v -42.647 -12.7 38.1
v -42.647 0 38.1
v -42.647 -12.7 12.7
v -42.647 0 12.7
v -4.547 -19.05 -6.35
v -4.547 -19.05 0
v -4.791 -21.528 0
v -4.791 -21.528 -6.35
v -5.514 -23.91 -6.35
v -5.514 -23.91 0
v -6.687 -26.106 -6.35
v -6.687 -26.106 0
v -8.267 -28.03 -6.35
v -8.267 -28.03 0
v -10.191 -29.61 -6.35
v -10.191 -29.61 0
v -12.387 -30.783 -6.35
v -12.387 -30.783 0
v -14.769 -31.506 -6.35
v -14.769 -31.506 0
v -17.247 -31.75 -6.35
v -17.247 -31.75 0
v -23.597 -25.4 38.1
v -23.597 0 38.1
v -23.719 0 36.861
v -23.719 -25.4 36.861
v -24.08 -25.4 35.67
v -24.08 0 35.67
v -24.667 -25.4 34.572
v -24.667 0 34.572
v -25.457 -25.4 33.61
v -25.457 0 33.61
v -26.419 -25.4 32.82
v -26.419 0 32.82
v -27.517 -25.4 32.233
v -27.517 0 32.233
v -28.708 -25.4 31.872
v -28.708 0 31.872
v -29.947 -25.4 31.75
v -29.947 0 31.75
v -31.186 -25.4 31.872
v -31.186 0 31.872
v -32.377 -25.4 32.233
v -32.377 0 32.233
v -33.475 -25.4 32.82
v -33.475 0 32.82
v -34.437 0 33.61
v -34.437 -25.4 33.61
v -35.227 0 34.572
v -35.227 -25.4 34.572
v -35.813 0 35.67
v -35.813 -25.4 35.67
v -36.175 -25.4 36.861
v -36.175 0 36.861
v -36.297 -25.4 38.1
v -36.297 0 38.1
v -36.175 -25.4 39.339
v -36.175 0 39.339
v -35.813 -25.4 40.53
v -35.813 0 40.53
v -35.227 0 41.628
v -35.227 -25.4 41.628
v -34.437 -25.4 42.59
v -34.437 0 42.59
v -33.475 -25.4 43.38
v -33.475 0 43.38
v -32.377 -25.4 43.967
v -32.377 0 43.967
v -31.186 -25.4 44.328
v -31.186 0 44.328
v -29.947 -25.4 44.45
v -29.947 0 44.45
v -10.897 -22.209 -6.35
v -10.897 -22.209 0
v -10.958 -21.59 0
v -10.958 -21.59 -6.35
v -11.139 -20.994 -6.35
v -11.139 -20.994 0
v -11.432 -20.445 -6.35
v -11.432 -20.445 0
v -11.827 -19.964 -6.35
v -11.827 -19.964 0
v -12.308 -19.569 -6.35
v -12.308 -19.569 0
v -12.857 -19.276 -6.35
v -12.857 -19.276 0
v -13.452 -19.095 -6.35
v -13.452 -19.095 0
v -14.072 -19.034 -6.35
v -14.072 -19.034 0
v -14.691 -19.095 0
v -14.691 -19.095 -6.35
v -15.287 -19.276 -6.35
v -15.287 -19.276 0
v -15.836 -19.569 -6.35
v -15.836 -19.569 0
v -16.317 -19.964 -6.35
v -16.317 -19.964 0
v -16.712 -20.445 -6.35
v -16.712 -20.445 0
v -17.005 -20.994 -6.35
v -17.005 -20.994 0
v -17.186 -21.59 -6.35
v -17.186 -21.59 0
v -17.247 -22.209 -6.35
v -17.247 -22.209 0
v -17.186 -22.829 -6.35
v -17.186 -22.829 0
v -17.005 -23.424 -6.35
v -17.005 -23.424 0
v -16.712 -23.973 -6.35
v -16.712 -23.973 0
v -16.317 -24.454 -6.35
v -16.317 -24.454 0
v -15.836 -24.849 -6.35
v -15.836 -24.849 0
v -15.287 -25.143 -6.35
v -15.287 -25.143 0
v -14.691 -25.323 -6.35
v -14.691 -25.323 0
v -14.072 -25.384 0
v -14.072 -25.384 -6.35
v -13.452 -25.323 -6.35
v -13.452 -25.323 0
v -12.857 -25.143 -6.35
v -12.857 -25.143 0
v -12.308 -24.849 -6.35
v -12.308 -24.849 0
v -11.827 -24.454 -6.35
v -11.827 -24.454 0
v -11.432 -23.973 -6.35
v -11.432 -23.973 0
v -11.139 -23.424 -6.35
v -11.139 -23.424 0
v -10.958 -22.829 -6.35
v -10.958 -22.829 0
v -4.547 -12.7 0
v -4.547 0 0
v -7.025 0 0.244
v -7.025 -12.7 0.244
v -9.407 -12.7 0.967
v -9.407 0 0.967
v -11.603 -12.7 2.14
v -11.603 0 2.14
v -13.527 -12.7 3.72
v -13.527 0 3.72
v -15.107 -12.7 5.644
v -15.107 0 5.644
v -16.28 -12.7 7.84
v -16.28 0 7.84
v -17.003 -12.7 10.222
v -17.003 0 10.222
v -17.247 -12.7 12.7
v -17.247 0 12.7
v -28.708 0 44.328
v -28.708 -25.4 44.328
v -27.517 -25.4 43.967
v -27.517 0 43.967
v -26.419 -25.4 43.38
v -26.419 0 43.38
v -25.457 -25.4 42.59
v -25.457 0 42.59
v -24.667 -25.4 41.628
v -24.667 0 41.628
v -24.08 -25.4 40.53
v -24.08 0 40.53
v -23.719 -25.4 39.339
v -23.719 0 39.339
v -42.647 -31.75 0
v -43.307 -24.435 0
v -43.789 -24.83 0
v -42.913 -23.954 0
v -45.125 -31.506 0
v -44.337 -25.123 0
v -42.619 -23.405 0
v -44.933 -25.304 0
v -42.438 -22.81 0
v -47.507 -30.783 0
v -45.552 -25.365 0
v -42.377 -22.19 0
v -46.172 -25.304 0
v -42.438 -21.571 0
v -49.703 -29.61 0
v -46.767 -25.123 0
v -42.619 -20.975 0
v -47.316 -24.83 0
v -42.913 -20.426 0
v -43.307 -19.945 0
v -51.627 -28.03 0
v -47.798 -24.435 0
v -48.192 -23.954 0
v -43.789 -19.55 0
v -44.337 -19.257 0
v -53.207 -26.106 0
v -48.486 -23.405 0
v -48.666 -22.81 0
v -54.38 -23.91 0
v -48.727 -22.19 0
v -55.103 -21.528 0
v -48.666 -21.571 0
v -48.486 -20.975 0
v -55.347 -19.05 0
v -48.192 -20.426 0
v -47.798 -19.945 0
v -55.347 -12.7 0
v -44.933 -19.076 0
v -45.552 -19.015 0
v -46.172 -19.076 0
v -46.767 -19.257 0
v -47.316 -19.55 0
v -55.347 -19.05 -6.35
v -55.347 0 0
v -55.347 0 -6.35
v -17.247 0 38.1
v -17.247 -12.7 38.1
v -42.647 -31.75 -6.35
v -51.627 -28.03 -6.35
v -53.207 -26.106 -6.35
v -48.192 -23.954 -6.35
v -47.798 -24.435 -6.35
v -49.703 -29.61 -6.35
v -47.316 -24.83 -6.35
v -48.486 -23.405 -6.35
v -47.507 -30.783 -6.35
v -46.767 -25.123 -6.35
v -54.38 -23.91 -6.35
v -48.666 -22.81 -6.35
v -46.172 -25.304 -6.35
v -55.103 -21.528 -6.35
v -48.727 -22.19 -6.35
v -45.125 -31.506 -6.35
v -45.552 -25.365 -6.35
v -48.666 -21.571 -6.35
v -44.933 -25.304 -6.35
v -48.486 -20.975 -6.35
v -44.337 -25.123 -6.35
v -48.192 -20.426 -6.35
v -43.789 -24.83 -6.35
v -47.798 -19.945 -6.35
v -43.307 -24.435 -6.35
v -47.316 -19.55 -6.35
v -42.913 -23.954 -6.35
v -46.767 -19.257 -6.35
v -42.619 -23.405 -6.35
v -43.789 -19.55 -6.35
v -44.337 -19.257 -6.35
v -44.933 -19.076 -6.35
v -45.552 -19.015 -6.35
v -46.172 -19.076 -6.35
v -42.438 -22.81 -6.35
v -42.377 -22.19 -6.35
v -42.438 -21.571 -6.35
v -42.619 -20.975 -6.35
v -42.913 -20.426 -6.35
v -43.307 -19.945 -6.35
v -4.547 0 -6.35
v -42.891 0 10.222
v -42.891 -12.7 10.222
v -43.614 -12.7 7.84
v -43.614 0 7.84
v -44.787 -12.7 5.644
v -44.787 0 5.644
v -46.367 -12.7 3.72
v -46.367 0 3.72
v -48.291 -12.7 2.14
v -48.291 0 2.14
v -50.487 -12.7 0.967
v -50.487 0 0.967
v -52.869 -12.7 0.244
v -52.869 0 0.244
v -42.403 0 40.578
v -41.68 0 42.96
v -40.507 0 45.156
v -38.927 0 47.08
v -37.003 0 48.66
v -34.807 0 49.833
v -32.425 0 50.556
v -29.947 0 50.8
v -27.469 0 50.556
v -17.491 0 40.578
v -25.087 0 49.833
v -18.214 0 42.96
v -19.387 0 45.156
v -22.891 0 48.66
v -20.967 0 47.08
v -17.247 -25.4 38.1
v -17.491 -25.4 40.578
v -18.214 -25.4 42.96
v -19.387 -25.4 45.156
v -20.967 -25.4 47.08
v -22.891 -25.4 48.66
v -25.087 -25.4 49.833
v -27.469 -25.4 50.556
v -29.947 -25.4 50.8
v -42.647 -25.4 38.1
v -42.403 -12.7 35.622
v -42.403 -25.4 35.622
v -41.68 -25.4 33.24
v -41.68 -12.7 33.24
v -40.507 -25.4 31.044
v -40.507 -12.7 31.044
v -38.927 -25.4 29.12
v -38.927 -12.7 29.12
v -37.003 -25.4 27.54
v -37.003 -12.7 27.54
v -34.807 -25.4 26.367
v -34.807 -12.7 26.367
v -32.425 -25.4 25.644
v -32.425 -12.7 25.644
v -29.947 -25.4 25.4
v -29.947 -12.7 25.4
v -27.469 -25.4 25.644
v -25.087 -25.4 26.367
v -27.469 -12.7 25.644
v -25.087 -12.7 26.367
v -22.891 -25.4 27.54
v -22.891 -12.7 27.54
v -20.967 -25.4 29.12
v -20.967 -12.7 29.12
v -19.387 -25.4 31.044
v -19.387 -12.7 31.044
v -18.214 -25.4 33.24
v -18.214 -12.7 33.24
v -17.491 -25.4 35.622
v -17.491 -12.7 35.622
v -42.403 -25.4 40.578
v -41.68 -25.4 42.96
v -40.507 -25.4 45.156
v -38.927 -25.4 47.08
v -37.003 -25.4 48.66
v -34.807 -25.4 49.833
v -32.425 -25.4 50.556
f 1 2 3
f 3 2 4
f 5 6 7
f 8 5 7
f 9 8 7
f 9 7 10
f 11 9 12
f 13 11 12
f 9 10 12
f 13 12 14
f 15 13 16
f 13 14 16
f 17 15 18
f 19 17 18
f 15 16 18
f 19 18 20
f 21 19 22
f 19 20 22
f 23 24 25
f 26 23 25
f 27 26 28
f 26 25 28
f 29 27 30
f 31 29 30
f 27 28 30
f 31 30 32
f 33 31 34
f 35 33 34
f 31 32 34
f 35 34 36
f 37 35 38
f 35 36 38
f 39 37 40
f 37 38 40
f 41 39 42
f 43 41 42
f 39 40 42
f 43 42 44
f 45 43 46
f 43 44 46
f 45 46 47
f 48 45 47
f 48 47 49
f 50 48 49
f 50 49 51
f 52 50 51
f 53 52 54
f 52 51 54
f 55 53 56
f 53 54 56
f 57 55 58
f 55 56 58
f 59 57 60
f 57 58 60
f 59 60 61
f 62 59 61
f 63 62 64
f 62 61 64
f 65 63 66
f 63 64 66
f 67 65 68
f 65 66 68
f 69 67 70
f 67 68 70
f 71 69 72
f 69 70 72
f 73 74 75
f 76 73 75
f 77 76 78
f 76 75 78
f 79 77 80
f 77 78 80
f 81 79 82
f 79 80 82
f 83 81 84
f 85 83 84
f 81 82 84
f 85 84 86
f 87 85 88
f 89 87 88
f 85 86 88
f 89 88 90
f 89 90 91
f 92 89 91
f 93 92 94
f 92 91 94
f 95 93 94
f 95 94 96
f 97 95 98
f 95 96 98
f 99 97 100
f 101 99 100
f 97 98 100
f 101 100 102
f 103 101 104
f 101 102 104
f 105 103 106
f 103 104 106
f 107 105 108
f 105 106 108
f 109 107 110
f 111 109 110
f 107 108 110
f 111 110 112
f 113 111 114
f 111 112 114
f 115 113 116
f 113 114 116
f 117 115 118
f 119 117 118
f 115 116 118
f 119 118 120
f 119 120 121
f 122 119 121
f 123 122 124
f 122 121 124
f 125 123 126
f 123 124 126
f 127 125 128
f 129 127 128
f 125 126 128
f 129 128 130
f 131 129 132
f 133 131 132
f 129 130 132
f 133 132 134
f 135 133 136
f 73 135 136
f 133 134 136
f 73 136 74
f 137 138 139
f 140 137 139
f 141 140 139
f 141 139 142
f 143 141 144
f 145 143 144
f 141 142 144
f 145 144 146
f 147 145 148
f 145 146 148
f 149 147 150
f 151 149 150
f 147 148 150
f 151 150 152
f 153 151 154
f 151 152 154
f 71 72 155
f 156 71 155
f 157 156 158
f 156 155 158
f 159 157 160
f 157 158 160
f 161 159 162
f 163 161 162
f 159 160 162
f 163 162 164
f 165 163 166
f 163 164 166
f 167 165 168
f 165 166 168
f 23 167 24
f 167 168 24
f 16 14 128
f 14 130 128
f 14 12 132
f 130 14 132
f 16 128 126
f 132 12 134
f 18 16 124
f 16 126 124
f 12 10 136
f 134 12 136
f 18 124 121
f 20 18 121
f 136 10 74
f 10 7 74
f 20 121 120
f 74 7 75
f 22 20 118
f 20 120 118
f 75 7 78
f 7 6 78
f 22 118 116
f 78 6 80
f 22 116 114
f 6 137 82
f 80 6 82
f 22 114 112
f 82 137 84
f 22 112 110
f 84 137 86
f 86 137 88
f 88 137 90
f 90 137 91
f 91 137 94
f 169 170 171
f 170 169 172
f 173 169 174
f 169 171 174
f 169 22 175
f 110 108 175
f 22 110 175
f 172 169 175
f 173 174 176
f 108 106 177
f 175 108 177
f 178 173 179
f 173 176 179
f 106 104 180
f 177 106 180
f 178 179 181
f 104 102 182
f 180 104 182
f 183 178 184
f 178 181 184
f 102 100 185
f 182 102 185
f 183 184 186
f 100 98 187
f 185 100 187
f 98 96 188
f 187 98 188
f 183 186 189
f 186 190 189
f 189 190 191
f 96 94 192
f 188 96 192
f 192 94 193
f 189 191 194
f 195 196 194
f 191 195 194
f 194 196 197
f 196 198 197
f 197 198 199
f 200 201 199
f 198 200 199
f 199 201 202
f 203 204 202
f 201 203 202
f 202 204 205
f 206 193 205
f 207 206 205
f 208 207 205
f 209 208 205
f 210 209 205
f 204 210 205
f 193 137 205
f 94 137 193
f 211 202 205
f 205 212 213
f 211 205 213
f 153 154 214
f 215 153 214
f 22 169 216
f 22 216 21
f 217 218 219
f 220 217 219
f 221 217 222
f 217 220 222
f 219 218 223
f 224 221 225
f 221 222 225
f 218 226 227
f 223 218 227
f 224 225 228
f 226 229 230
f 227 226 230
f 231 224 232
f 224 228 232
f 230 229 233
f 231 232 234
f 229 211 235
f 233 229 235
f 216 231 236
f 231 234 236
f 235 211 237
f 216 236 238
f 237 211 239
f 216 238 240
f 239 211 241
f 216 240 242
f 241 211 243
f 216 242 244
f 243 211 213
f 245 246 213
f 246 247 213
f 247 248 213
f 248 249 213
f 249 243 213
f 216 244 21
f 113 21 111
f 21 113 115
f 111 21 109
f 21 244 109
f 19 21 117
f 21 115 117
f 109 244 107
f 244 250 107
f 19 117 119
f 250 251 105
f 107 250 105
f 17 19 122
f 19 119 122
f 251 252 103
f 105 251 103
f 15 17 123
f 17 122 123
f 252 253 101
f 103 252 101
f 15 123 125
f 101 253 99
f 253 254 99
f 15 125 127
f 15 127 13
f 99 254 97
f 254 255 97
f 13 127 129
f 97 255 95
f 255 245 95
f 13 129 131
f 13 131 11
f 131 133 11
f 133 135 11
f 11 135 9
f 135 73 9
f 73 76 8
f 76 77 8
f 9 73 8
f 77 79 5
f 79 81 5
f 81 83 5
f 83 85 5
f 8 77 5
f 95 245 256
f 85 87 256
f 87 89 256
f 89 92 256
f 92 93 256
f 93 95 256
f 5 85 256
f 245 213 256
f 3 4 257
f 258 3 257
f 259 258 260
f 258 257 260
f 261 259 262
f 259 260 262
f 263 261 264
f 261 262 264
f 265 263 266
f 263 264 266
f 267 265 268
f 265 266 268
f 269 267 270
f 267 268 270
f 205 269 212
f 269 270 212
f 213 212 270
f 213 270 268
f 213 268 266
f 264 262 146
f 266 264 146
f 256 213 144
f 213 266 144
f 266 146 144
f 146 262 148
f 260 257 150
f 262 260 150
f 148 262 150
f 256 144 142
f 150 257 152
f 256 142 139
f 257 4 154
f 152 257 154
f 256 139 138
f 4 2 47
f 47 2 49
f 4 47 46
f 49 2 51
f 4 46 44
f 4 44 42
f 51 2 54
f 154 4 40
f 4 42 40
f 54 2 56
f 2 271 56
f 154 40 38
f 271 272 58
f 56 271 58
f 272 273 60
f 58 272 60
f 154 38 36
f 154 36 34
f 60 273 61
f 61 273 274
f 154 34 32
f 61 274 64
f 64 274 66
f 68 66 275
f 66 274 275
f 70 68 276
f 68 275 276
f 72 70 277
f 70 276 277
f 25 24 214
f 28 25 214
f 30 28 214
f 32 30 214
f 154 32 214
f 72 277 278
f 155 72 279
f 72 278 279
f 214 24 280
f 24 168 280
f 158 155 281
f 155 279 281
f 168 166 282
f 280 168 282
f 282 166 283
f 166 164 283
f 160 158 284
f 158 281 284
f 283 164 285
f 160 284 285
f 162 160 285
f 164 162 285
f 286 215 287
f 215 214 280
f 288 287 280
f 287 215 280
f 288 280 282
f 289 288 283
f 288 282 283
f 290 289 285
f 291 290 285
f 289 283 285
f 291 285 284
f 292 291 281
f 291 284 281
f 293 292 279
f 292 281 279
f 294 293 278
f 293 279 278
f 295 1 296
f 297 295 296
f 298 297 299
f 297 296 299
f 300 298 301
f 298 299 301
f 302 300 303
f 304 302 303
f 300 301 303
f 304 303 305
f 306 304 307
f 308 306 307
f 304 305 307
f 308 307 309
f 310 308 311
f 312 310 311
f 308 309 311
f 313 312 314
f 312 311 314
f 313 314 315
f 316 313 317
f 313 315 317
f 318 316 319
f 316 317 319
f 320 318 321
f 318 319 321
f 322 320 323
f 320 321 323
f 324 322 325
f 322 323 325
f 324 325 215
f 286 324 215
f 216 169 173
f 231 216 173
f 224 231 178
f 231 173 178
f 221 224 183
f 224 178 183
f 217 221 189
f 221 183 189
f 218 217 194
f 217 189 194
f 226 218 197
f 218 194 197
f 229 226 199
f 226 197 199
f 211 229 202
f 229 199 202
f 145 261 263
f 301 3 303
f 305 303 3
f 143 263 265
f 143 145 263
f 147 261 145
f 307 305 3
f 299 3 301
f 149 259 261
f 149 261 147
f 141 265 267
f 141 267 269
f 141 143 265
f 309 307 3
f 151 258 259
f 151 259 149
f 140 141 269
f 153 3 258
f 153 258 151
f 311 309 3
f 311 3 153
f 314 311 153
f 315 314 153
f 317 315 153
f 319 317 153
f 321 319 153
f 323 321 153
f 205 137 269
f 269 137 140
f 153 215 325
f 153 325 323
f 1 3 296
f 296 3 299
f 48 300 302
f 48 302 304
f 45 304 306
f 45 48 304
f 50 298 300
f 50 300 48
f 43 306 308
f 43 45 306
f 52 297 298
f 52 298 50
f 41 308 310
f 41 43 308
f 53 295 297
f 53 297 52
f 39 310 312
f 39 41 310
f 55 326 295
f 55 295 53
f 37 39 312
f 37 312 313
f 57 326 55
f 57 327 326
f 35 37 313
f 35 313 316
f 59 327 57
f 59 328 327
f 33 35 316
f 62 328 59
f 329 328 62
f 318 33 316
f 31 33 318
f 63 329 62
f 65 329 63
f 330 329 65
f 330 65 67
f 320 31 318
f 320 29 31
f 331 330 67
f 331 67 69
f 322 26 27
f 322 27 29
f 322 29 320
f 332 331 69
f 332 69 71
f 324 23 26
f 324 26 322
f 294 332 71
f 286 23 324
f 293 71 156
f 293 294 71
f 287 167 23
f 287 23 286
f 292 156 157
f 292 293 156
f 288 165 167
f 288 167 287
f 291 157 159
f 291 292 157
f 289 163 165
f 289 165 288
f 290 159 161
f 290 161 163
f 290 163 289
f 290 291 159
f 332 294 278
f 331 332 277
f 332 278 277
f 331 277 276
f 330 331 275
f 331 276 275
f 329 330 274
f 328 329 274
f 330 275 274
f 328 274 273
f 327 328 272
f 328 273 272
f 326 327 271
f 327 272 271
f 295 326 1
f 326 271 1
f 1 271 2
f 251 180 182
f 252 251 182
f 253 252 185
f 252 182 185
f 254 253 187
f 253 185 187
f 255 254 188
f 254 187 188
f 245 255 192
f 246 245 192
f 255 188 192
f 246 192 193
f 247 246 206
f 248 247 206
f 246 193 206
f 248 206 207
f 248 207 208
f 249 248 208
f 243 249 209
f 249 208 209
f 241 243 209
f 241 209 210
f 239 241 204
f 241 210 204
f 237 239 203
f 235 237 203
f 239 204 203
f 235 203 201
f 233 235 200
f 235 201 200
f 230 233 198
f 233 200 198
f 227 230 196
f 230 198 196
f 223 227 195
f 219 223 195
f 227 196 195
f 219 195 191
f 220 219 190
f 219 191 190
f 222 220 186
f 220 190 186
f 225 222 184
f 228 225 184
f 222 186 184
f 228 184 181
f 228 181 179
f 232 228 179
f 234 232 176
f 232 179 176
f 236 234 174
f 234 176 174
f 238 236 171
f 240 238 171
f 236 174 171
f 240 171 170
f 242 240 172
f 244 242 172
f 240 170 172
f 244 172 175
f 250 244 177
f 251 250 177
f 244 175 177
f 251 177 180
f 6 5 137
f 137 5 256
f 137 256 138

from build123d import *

# Parameters (mm, degrees)
F1_DEPTH = 31.75
F2_DEPTH = 25.4
F3_DEPTH = 12.7
F5_DEPTH = 6.35
F6_R     = 3.175
F7_DEPTH = 6.35


with BuildPart() as f1:
    # F0 (on Front) → F1 (new body)
    with BuildSketch(Plane.XZ):
        Polygon((-42.646856, 0), (-55.346856, 0), (-55.346856, -6.35), (-4.546856, -6.35), (-4.546856, 0), (-17.246856, 0), align=None)
    extrude(amount=F1_DEPTH)



with BuildPart() as f2:
    # F0 (on Front) → F2 (new body)
    with BuildSketch(Plane.XZ):
        with BuildLine():
            ThreePointArc((-17.246856, 38.1), (-20.9666, 47.080256), (-29.946856, 50.8))
            ThreePointArc((-29.946856, 50.8), (-38.927112, 47.080256), (-42.646856, 38.1))
            ThreePointArc((-42.646856, 38.1), (-29.946856, 25.4), (-17.246856, 38.1))
        make_face()
        with BuildLine():
            ThreePointArc((-23.596856, 38.1), (-34.436984, 33.609872), (-29.946856, 44.45))
            ThreePointArc((-29.946856, 44.45), (-25.456728, 42.590128), (-23.596856, 38.1))
        make_face(mode=Mode.SUBTRACT)
    extrude(amount=F2_DEPTH)


with BuildPart() as f1_1:
    add(f1.part)

    add(f2.part)  # F3 merges F2
    # F0 (on Front) → F3 (join)
    with BuildSketch(Plane.XZ):
        with BuildLine():
            ThreePointArc((-42.646856, 12.7), (-46.3666, 3.719744), (-55.346856, 0))
            Line((-55.346856, 0), (-42.646856, 0))
            Line((-42.646856, 0), (-17.246856, 0))
            Line((-17.246856, 0), (-4.546856, 0))
            ThreePointArc((-4.546856, 0), (-13.527112, 3.719744), (-17.246856, 12.7))
            Line((-17.246856, 12.7), (-17.246856, 38.1))
            ThreePointArc((-17.246856, 38.1), (-29.946856, 25.4), (-42.646856, 38.1))
            Line((-42.646856, 38.1), (-42.646856, 12.7))
        make_face()
    extrude(amount=F3_DEPTH)

    # F4 (on face) → F5 (cut)
    with BuildSketch(Plane.XY):
        with BuildLine():
            ThreePointArc((-42.646856, -31.75), (-51.627112, -28.030256), (-55.346856, -19.05))
            Line((-55.346856, -19.05), (-55.346856, -31.75))
            Line((-55.346856, -31.75), (-42.646856, -31.75))
        make_face()
        with BuildLine():
            Line((-4.546856, -31.75), (-4.546856, -19.05))
            ThreePointArc((-4.546856, -19.05), (-8.2666, -28.030256), (-17.246856, -31.75))
            Line((-17.246856, -31.75), (-4.546856, -31.75))
        make_face()
    extrude(amount=-F5_DEPTH, mode=Mode.SUBTRACT)

    # F6 (on face) → F7 (cut)
    with BuildSketch(Plane.XY):
        with Locations((-45.552474, -22.190144)):
            Circle(F6_R)
        with Locations((-14.071856, -22.20941)):
            Circle(F6_R)
    extrude(amount=-F7_DEPTH, mode=Mode.SUBTRACT)


solid = f1_1.part
